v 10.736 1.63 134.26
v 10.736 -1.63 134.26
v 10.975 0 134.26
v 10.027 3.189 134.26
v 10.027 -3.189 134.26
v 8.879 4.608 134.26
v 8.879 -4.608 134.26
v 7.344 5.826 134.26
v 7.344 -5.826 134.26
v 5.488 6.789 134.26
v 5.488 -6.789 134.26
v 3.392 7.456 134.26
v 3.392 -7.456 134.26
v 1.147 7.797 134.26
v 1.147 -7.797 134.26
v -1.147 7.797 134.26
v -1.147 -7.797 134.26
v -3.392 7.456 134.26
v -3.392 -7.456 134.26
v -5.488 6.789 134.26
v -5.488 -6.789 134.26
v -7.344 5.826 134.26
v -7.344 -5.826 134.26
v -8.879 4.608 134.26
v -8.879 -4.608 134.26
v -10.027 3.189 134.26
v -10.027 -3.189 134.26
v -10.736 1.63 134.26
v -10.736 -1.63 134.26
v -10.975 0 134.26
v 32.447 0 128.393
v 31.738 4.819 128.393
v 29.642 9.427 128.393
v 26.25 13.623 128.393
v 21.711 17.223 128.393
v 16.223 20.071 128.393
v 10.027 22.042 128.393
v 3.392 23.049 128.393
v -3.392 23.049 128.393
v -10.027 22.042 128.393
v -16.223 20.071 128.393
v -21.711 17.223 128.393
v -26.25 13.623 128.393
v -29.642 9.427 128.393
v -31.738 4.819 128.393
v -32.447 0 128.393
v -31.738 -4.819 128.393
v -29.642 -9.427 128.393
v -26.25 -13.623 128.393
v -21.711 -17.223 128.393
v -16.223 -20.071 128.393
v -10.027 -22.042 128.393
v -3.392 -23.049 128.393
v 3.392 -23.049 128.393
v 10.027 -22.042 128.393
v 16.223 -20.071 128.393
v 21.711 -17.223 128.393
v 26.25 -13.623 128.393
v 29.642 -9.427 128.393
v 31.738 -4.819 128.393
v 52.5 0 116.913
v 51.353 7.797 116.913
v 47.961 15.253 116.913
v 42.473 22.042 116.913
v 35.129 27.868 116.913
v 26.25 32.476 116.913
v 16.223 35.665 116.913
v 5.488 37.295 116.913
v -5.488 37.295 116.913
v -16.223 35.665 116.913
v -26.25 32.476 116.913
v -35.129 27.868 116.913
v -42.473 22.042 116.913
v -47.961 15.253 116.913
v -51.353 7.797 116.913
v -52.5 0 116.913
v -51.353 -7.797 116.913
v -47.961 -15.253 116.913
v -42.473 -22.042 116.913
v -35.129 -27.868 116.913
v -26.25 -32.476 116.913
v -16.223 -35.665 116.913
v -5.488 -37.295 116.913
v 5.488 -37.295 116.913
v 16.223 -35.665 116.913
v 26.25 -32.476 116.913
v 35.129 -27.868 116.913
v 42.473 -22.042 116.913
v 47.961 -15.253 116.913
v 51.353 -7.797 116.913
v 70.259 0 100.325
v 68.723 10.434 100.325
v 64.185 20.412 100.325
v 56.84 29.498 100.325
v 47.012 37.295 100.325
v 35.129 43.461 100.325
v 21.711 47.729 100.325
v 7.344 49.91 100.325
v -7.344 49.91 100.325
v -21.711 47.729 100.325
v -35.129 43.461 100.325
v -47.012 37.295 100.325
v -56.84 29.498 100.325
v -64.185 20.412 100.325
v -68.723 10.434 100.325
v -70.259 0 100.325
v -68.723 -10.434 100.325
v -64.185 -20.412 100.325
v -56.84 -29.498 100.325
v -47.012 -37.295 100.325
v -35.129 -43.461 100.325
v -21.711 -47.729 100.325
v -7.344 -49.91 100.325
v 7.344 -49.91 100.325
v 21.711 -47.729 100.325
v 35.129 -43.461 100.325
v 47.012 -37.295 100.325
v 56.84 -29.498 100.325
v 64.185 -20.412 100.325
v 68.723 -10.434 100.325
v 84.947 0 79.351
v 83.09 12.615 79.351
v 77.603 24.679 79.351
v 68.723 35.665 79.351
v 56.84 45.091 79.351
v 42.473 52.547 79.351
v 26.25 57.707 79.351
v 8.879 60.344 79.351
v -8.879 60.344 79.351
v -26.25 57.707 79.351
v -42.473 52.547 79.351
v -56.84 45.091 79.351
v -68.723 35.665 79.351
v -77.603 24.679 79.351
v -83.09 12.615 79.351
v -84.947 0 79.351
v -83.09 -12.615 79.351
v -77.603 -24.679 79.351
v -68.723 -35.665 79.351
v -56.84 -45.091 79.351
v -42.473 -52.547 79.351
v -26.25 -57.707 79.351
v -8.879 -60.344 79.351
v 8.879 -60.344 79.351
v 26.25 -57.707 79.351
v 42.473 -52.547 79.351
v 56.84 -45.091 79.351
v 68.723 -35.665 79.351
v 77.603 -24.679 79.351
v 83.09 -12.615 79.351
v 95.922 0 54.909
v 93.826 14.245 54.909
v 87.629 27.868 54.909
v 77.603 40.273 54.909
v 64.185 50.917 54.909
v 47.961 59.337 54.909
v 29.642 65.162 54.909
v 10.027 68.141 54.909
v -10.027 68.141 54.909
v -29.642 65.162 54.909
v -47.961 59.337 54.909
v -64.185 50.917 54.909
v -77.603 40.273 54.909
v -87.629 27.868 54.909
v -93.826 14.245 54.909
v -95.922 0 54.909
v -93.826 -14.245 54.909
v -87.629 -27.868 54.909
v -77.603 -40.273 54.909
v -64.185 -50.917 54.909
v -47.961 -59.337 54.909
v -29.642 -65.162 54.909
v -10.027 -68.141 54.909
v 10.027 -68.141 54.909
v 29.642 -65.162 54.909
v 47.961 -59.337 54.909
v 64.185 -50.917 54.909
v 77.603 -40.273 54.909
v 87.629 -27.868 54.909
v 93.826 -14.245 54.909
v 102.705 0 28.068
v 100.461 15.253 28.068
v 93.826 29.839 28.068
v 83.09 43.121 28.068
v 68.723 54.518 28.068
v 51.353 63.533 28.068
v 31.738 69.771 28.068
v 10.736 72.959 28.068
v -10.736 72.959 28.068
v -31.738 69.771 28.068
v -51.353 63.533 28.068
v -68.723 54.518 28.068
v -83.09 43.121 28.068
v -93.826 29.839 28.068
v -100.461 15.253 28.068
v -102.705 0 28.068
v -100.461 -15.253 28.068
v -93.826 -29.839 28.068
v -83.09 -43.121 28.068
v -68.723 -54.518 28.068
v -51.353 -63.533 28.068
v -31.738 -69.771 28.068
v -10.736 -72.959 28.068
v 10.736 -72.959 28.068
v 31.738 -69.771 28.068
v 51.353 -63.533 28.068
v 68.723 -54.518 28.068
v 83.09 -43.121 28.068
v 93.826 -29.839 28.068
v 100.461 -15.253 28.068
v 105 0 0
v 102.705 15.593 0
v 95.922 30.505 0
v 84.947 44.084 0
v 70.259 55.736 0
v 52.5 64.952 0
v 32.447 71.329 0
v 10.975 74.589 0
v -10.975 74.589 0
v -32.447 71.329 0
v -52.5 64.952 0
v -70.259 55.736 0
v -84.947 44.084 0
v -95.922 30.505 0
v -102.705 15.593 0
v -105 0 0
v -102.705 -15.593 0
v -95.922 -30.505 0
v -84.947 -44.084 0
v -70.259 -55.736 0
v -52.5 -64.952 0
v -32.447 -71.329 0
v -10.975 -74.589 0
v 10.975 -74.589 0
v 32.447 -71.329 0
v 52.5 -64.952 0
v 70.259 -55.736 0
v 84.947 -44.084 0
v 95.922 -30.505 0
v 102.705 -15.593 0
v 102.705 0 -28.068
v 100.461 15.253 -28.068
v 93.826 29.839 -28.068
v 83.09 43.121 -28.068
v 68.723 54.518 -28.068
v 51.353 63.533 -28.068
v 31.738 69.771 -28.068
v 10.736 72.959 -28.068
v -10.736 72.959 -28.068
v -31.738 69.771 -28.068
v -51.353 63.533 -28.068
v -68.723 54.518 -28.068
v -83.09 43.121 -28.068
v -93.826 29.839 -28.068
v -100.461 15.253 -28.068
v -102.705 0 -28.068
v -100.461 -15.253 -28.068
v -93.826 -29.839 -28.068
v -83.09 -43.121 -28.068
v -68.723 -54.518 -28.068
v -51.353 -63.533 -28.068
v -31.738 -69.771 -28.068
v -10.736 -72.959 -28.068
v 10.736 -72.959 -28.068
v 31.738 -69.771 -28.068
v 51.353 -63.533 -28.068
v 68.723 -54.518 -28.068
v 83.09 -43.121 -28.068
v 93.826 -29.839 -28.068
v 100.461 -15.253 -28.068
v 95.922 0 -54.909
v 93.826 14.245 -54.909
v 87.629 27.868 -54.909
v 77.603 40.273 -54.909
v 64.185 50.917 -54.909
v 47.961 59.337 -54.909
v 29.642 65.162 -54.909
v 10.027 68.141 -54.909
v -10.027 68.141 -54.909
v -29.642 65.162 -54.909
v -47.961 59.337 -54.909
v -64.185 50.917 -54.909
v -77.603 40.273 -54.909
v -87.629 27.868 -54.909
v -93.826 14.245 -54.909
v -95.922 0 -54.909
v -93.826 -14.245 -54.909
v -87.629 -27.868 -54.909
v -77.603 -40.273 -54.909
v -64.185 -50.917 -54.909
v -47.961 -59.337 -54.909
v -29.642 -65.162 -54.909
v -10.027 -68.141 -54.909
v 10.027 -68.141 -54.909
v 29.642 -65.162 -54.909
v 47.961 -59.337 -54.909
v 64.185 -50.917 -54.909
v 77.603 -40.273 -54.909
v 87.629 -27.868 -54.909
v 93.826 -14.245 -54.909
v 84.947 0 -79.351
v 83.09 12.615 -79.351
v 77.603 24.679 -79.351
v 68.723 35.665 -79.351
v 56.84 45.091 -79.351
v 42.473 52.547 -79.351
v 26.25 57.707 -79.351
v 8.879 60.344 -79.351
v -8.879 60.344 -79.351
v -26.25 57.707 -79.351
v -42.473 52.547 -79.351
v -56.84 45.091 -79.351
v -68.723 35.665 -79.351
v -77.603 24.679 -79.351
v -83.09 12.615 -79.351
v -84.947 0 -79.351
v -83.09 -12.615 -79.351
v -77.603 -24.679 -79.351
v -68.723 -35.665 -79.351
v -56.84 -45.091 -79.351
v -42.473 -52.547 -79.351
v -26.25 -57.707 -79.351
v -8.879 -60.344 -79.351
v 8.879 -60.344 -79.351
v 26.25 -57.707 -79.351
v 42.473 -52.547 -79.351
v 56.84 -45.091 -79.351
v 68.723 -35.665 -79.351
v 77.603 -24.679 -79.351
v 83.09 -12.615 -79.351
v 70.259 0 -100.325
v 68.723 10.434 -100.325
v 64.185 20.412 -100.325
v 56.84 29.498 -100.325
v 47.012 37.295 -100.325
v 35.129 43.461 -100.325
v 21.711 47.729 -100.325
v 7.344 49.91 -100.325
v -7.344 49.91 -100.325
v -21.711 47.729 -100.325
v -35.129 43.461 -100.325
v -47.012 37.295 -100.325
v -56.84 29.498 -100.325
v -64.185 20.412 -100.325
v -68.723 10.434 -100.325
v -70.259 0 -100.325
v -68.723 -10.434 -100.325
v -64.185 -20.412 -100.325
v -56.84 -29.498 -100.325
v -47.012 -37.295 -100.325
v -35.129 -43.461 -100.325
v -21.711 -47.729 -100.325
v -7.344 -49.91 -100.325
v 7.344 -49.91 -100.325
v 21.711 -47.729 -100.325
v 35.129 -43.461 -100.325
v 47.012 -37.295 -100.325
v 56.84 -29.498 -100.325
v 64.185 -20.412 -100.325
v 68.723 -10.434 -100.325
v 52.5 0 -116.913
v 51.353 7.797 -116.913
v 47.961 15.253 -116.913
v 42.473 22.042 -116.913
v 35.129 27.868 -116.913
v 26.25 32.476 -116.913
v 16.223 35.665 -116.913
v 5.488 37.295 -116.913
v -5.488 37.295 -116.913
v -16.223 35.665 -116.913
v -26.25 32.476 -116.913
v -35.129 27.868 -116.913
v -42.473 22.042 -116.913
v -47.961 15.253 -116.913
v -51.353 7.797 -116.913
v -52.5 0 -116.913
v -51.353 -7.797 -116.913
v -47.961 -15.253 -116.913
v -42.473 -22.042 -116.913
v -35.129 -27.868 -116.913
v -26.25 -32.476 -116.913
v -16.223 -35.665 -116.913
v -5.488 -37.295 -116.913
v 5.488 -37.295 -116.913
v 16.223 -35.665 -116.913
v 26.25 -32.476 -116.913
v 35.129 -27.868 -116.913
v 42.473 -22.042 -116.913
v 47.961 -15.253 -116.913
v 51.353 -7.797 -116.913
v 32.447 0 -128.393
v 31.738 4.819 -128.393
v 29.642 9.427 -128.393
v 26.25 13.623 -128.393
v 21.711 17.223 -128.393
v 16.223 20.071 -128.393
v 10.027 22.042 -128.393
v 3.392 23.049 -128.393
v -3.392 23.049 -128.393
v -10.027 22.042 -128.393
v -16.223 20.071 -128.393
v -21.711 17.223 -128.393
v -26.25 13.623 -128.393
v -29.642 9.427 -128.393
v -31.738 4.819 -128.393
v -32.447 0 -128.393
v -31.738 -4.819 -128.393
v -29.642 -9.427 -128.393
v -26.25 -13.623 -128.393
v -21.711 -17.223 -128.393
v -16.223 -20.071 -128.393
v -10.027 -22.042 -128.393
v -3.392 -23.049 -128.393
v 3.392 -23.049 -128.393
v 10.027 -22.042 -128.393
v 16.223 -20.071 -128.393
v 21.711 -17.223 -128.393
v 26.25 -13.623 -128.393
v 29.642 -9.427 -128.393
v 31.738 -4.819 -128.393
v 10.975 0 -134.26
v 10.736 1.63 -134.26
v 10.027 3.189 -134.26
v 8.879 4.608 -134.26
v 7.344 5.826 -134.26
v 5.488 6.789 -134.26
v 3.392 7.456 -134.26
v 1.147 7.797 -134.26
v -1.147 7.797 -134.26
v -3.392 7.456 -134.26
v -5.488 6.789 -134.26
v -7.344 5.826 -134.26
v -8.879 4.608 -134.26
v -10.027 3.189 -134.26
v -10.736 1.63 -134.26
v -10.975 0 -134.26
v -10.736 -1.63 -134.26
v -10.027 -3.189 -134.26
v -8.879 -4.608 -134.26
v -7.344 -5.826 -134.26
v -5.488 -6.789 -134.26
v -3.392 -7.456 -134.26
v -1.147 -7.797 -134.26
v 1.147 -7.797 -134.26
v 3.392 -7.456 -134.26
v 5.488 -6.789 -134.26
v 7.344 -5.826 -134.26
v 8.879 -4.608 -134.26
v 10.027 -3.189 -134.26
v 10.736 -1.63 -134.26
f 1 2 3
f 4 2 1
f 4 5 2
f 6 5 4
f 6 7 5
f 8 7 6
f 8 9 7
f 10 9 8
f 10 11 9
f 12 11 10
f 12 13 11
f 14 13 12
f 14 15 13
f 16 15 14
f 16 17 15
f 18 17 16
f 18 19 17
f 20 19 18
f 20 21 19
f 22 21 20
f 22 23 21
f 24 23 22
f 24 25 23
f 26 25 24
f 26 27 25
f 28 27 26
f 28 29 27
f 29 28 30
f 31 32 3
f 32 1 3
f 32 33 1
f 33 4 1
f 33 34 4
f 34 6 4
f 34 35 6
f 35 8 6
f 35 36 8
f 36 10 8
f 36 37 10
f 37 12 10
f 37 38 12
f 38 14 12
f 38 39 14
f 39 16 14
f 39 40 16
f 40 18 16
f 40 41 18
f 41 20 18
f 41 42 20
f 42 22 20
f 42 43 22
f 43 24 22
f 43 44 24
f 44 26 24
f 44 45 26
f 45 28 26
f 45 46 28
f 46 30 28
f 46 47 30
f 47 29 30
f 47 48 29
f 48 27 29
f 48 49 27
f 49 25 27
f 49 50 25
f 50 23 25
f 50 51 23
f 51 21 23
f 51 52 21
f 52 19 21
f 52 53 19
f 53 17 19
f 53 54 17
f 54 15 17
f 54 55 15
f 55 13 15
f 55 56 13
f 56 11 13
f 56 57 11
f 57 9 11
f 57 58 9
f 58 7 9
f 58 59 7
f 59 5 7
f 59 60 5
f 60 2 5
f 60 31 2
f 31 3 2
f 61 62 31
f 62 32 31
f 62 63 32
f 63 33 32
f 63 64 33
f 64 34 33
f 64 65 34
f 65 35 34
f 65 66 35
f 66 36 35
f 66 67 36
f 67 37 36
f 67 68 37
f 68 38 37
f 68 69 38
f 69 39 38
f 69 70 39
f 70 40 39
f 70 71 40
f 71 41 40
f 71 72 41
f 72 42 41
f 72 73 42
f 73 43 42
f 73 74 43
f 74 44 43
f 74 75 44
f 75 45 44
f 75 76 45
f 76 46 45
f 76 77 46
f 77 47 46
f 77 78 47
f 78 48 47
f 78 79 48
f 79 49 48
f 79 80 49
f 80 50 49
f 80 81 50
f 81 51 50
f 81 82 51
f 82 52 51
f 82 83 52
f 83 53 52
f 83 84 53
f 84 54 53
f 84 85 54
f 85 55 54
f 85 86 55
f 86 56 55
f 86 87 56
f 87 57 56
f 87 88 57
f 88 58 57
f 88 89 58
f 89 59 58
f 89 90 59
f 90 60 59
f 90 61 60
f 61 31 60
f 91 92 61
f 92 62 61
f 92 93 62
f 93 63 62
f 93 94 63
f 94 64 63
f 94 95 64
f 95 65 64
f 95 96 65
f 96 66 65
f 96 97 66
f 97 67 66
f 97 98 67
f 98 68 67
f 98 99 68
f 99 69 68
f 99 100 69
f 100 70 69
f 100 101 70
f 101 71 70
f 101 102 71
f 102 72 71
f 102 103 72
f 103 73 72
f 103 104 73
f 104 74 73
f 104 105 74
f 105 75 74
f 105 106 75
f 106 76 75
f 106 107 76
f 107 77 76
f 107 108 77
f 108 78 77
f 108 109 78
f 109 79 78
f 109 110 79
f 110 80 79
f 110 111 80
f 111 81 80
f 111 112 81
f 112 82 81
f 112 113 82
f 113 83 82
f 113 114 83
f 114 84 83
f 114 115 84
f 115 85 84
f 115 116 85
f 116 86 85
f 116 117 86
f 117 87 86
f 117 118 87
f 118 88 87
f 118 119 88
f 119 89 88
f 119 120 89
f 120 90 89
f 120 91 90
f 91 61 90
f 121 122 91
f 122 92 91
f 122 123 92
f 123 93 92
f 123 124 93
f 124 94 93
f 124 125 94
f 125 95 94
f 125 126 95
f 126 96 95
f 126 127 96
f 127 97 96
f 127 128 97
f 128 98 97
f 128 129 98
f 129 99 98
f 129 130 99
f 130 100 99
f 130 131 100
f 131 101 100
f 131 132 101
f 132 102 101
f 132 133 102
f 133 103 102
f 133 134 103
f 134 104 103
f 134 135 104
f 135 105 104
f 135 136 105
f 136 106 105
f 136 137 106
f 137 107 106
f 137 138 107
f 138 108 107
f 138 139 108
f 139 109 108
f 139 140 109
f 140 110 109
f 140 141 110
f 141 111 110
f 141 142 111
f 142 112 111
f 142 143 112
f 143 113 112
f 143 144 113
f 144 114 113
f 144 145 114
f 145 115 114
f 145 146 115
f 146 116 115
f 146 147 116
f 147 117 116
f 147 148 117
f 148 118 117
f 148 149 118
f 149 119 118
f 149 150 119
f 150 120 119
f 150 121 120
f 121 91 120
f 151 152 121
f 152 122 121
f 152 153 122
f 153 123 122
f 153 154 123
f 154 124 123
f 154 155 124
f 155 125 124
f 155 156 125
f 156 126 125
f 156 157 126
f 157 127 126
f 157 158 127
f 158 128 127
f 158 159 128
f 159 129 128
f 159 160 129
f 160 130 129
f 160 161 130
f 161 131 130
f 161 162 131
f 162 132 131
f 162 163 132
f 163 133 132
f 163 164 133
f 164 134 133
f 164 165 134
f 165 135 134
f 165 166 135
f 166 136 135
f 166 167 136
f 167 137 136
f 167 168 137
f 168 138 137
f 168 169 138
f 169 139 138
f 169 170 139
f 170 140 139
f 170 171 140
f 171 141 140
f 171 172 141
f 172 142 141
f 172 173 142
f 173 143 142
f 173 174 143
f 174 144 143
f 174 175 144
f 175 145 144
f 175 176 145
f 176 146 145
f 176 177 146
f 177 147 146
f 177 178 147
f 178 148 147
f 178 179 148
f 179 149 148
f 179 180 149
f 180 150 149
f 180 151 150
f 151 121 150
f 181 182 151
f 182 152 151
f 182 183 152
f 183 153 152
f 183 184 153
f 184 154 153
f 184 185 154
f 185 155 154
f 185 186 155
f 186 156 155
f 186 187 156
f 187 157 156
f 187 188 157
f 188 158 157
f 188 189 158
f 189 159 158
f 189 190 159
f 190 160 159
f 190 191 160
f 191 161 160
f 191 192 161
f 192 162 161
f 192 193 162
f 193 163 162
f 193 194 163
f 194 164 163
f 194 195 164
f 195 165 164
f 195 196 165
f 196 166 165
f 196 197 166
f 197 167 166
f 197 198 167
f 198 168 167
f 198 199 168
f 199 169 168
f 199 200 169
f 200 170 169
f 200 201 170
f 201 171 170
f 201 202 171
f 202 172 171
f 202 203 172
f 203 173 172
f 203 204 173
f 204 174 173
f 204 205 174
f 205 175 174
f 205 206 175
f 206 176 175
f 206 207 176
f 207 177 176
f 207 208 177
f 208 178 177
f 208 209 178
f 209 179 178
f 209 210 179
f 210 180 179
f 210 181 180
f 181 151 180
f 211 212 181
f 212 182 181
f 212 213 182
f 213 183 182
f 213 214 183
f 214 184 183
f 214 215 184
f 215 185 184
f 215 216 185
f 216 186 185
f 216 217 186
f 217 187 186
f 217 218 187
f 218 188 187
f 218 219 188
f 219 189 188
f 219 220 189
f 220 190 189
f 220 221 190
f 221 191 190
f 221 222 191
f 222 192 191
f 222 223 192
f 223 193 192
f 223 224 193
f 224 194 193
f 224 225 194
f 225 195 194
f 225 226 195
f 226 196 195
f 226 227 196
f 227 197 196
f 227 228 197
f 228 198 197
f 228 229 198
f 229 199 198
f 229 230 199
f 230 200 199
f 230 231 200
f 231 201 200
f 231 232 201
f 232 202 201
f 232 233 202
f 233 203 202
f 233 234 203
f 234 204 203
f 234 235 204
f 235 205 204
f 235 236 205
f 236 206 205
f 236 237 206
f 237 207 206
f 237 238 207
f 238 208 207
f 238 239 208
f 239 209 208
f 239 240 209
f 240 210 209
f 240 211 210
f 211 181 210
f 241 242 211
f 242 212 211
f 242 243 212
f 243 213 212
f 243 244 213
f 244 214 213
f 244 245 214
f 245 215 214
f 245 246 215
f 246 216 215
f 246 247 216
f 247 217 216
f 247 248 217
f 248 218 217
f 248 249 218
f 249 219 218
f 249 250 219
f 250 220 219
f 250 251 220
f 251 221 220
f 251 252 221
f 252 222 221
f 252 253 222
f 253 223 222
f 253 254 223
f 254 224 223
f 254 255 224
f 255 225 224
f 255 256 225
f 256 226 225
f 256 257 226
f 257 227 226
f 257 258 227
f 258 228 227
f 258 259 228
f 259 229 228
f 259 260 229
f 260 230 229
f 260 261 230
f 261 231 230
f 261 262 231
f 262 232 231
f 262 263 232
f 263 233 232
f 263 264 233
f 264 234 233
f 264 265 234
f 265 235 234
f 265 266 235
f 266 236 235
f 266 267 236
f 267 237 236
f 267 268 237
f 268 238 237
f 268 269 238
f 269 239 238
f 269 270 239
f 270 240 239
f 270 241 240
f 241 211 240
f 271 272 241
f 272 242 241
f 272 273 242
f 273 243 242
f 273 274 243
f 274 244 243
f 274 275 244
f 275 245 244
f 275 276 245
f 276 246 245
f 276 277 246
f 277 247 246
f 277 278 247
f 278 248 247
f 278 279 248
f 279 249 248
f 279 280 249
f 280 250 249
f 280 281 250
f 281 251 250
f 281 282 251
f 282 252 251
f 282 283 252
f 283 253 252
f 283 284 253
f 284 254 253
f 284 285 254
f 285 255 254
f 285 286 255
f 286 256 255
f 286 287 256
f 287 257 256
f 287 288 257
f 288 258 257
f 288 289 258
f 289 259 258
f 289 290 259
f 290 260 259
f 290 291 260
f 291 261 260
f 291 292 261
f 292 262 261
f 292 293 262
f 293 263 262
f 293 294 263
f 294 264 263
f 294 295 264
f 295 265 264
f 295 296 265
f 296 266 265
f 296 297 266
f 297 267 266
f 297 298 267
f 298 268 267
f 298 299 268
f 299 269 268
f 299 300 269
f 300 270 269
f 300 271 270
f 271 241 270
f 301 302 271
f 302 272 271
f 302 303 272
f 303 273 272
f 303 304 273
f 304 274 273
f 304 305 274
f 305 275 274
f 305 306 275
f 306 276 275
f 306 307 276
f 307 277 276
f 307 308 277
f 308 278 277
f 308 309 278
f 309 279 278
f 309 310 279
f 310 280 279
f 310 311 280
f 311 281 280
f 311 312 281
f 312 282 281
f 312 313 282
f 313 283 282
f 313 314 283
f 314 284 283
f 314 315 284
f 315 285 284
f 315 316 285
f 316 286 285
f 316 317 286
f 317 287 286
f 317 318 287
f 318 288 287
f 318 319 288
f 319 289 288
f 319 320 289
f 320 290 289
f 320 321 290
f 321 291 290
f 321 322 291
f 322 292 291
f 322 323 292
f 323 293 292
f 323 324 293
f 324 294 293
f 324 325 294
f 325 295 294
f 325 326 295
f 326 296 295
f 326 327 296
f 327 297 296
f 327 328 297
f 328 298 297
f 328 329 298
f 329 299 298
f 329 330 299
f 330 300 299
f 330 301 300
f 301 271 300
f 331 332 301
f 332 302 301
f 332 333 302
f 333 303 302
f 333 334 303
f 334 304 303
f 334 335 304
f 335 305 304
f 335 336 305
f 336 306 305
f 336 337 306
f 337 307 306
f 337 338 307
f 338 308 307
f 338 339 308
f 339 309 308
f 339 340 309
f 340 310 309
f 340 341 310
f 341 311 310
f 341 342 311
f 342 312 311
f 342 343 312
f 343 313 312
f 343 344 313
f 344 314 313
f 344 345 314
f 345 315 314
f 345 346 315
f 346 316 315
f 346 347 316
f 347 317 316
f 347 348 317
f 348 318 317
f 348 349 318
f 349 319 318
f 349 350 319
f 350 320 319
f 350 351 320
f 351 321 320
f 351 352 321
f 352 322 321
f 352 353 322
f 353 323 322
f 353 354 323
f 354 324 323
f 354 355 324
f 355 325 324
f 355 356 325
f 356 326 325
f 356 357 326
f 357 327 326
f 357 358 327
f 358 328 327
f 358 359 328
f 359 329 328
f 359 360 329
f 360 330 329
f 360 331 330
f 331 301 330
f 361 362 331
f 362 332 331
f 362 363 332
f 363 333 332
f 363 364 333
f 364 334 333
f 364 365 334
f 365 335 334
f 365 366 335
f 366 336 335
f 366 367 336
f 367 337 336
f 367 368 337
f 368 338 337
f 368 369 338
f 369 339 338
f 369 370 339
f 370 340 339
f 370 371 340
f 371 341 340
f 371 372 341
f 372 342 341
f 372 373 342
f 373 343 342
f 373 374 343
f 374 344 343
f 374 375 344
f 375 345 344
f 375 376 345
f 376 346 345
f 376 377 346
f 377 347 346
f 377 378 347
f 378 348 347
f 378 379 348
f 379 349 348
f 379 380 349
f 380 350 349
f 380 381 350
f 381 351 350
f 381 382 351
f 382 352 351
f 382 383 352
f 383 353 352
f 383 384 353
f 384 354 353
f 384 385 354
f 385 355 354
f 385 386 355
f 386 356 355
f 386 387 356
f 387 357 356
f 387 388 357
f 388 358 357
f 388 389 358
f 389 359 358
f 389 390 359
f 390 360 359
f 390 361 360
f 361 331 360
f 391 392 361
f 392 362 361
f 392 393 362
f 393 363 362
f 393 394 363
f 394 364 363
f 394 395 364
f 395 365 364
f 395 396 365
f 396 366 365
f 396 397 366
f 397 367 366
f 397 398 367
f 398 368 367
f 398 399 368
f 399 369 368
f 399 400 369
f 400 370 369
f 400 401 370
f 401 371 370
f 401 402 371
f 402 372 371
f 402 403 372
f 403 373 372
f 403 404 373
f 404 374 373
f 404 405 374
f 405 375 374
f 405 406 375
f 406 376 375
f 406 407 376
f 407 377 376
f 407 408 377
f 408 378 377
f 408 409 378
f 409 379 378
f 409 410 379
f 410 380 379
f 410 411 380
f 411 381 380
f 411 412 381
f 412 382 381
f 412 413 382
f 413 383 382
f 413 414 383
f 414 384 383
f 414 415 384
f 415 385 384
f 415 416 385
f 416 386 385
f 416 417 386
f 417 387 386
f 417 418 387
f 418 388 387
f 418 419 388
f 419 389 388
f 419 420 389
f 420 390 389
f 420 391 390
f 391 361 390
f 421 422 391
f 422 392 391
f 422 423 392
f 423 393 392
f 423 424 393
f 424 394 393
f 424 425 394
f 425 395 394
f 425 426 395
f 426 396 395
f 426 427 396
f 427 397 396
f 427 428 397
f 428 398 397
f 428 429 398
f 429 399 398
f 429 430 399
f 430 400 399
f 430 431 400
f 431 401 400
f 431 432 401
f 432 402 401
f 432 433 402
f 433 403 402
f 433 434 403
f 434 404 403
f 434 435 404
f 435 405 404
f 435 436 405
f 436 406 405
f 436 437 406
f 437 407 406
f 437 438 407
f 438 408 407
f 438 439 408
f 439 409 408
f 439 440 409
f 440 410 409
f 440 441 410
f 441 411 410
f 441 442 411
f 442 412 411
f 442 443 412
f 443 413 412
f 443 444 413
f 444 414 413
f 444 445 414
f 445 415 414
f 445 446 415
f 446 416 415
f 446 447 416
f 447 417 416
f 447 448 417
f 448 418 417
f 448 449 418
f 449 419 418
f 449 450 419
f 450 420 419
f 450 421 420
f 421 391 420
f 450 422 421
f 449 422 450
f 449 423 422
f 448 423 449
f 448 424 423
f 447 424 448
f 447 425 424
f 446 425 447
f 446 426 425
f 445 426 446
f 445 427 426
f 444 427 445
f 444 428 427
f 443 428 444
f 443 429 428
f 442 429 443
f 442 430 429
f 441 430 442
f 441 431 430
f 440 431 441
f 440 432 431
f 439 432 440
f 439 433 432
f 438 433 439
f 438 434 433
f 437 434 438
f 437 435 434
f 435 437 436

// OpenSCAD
// Generated by SolidPython 1.0.1 on 2020-07-29 00:46:47


scale(v = [7, 5, 9]) {
	sphere(r = 15);
}
/***********************************************
*********      SolidPython code:      **********
************************************************
 
# import packages: SolidPython
from solid import *
from solid.utils import *
from itertools import chain, combinations, permutations


class Resize:

    def __init__(self, scad_file):
        self.scad_file = scad_file
        #self.scad_file = import_scad(scad_file)
        # cone/cylinder param:
        self.r1 = 0
        self.r2 = 0
        self.h = 0
        # rectangular prism param:
        self.w = 0
        self.l = 0
        # ellipse param:
        self.r = 0

    # import OpenScad code (file name corresponds to shape)


    # classify shape + parameters
    def assign(self, param1, param2, param3):
        if self.scad_file == 'cone.scad':
            self.r1 = param1
            self.r2 = param2
            self.h = param3
        elif self.scad_file == 'cylinder.scad':
            self.r1 = param1
            self.r2 = param2
            self.h = param3
        elif self.scad_file == 'rectangularPrism.scad':
            self.h = param1
            self.l = param2
            self.w = param3
        else:
            self.r = param1
            self.h = param2

    # resize parameters
    def iterate(self):
        x = range(3, 20, 2)
        i = 1
        if self.scad_file == 'cone.scad':
            tempList = list(permutations(x, 2))
            for temp in tempList:
                param1 = temp[0]
                param2 = temp[1]
                filepath = 'produced_scad_files/' + 'cone' + str(param1) + '_' + str(param2) + '_' + '.scad'
                scad_render_to_file(cylinder(h=param1, r1=param2, r2=0), filepath)

        elif self.scad_file == 'cylinder.scad':
            tempList = list(permutations(x, 3))
            for temp in tempList:
                param1 = temp[0]
                param2 = temp[1]
                filepath = 'produced_scad_files/' + 'cylinder' + str(param1) + '_' + str(param2) + '_' + '.scad'
                scad_render_to_file(cylinder(h=param1, r1=param2, r2=param2), filepath)

        elif self.scad_file == 'rectangularPrism.scad':
            tempList = list(permutations(x, 3))
            for temp in tempList:
                param1 = temp[0]
                param2 = temp[1]
                param3 = temp[2]
                filepath = 'produced_scad_files/' + 'rectangularPrism' + str(param1) + '_' + str(param2) + '_' + str(
                    param3) + '.scad'
                scad_render_to_file(cube(size=(param1, param2, param3)), filepath)

        elif self.scad_file == 'ellipse.scad':
            tempList = list(permutations(x, 4))
            for temp in tempList:
                param1 = temp[0]
                param2 = temp[1]
                param3 = temp[2]
                param4 = temp[3]
                filepath = 'produced_scad_files/' + 'ellipse' + str(param1) + '_' + str(param2) + '_' + str(param3) + '_' + str(param4) + '.scad'
                scad_render_to_file(scale([param1, param2, param3])(sphere(r=param4)), filepath)

    def render_to_scadfile(self):
        scad_render_to_file(scad, 'example.scad') 
 
************************************************/
